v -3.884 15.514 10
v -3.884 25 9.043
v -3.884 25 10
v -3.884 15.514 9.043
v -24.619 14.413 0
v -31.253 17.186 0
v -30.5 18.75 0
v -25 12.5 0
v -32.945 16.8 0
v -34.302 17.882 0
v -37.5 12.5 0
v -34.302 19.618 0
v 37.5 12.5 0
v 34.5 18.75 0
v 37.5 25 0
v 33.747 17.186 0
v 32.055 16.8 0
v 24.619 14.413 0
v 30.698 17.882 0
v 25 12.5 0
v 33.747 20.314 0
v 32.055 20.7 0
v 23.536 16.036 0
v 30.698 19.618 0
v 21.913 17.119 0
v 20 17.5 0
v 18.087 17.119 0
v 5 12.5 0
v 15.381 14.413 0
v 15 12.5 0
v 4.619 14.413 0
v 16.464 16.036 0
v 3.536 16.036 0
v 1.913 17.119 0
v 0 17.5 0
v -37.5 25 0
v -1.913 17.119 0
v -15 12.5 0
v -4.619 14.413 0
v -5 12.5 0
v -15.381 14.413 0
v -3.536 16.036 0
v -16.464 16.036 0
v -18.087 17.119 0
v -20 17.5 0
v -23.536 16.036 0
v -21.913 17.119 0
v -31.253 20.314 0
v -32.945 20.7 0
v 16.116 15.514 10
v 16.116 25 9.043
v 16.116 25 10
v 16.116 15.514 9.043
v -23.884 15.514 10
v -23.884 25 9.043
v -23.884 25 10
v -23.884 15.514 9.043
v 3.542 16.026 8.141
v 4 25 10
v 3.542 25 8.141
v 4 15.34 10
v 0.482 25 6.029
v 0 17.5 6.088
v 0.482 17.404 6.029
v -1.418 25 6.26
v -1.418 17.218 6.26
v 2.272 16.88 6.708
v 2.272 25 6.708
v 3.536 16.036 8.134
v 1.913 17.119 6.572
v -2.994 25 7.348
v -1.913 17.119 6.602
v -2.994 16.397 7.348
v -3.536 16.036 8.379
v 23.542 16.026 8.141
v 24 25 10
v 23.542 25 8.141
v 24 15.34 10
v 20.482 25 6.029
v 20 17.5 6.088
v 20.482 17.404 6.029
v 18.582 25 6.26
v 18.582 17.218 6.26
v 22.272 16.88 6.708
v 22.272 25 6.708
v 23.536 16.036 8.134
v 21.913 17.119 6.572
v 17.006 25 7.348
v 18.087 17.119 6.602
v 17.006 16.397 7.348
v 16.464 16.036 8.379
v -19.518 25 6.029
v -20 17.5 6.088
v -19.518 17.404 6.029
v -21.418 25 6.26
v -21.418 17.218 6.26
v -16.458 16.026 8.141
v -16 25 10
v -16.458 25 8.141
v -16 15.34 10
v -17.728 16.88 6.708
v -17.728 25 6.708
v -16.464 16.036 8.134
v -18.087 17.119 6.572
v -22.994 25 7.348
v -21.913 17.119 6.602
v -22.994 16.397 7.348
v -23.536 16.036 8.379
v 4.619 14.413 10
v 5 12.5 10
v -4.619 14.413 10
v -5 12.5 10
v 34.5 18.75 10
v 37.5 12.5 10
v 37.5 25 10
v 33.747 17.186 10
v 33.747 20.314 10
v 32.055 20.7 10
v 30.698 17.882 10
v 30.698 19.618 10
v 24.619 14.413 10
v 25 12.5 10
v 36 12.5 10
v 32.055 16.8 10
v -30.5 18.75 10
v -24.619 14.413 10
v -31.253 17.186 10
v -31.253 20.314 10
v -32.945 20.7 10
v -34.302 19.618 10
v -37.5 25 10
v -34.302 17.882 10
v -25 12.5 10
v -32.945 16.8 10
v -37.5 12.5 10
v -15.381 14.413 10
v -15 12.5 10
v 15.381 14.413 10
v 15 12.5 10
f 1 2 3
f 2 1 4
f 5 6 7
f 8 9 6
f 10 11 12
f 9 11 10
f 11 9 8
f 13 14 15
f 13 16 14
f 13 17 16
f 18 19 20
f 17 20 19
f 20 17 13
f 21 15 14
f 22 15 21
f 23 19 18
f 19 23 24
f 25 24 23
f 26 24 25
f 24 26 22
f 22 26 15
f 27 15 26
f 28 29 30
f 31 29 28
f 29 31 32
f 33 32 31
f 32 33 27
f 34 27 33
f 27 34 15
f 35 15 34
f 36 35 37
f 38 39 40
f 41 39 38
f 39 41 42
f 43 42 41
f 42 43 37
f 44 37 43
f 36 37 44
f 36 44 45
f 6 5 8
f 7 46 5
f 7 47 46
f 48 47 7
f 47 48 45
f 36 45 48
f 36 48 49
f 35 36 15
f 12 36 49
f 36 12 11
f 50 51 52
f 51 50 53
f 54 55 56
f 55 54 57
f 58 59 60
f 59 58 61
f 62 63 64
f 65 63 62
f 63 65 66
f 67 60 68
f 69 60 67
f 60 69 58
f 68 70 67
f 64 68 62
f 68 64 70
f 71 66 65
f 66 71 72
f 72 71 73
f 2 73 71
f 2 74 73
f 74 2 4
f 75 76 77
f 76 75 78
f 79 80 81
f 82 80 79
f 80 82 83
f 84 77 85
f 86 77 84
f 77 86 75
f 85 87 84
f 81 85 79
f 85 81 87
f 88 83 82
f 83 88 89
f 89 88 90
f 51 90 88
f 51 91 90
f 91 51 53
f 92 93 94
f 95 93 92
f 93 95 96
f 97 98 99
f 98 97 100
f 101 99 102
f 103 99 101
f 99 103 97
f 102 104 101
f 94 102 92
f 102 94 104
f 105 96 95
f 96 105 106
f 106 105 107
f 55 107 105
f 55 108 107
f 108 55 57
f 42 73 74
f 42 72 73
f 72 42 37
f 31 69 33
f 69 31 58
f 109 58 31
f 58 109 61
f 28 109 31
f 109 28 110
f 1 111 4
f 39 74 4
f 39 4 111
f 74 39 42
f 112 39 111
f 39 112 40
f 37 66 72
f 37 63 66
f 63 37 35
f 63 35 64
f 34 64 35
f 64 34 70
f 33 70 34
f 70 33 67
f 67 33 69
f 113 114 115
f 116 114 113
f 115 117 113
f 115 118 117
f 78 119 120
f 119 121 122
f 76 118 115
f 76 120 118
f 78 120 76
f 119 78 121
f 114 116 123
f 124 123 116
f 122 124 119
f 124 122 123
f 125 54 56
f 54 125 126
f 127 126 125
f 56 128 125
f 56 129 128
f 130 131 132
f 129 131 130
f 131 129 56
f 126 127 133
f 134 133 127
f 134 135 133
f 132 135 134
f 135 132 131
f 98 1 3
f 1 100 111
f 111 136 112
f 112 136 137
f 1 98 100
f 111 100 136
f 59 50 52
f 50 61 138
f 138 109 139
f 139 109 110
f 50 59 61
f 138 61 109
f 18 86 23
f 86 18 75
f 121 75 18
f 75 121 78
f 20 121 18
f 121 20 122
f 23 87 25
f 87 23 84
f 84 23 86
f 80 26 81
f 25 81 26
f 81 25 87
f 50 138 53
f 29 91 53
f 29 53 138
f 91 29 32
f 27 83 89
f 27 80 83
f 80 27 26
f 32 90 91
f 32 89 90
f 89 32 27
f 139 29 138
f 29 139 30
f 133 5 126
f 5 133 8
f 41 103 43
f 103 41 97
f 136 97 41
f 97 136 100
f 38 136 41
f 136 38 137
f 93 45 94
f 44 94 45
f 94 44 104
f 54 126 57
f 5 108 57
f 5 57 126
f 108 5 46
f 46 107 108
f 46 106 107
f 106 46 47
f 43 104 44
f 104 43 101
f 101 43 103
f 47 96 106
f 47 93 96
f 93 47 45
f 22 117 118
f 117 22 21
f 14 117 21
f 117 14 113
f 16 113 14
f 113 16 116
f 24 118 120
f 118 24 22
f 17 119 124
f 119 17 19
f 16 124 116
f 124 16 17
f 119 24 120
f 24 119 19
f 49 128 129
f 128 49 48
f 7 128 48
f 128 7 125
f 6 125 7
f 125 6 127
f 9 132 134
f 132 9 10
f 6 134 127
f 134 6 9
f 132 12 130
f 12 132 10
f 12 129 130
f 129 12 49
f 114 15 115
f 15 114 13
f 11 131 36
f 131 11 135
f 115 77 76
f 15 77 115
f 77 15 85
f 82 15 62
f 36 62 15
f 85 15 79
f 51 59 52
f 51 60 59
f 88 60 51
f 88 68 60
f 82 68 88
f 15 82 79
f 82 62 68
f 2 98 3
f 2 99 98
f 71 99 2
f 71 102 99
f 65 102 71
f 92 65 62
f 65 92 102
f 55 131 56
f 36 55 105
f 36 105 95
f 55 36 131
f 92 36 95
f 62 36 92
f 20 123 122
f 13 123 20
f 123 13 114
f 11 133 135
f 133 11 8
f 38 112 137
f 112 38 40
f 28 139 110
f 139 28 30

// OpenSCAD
intersection() {
	union() {
		translate(v = [0, 12.5000000000, 0]) {
			difference() {
				translate(v = [0, 0, 10.0000000000]) {
					cube(center = true, size = [75, 25, 20]);
				}
				translate(v = [0, 12.5000000000, 0]) {
					translate(v = [0, 0, 10.0000000000]) {
						translate(v = [0, 0, 10.0000000000]) {
							cube(center = true, size = [75, 25, 20]);
						}
					}
				}
				union() {
					cylinder(d = 8, h = 30);
					translate(v = [20, 0, 0]) {
						cylinder(d = 8, h = 30);
					}
					translate(v = [-20, 0, 0]) {
						cylinder(d = 8, h = 30);
					}
				}
				translate(v = [0, 15.0000000000, 0]) {
					translate(v = [0, 0, 10.0000000000]) {
						rotate(a = [90, 0, 0]) {
							union() {
								cylinder(d = 8, h = 30);
								translate(v = [20, 0, 0]) {
									cylinder(d = 8, h = 30);
								}
								translate(v = [-20, 0, 0]) {
									cylinder(d = 8, h = 30);
								}
							}
						}
					}
				}
				union() {
					cylinder(d = 10, h = 10.0000000000);
					translate(v = [20, 0, 0]) {
						cylinder(d = 10, h = 10.0000000000);
					}
					translate(v = [-20, 0, 0]) {
						cylinder(d = 10, h = 10.0000000000);
					}
				}
				union() {
					translate(v = [32.5000000000, 0, 0]) {
						translate(v = [0, 6.2500000000, 0]) {
							cylinder(d = 4, h = 30);
						}
					}
					translate(v = [-32.5000000000, 0, 0]) {
						translate(v = [0, 6.2500000000, 0]) {
							cylinder(d = 4, h = 30);
						}
					}
				}
			}
		}
		rotate(a = [0, 0, 180]) {
			translate(v = [0, 12.5000000000, 0]) {
				difference() {
					translate(v = [0, 0, 10.0000000000]) {
						cube(center = true, size = [75, 25, 20]);
					}
					translate(v = [0, 12.5000000000, 0]) {
						translate(v = [0, 0, 10.0000000000]) {
							translate(v = [0, 0, 10.0000000000]) {
								cube(center = true, size = [75, 25, 20]);
							}
						}
					}
					union() {
						cylinder(d = 8, h = 30);
						translate(v = [20, 0, 0]) {
							cylinder(d = 8, h = 30);
						}
						translate(v = [-20, 0, 0]) {
							cylinder(d = 8, h = 30);
						}
					}
					translate(v = [0, 15.0000000000, 0]) {
						translate(v = [0, 0, 10.0000000000]) {
							rotate(a = [90, 0, 0]) {
								union() {
									cylinder(d = 8, h = 30);
									translate(v = [20, 0, 0]) {
										cylinder(d = 8, h = 30);
									}
									translate(v = [-20, 0, 0]) {
										cylinder(d = 8, h = 30);
									}
								}
							}
						}
					}
					union() {
						cylinder(d = 10, h = 10.0000000000);
						translate(v = [20, 0, 0]) {
							cylinder(d = 10, h = 10.0000000000);
						}
						translate(v = [-20, 0, 0]) {
							cylinder(d = 10, h = 10.0000000000);
						}
					}
					union() {
						translate(v = [32.5000000000, 0, 0]) {
							translate(v = [0, 6.2500000000, 0]) {
								cylinder(d = 4, h = 30);
							}
						}
						translate(v = [-32.5000000000, 0, 0]) {
							translate(v = [0, 6.2500000000, 0]) {
								cylinder(d = 4, h = 30);
							}
						}
					}
				}
			}
		}
		difference() {
			translate(v = [37.5000000000, 0, 0]) {
				translate(v = [0, 0, 30.0000000000]) {
					cube(center = true, size = [3, 25, 60]);
				}
			}
			union() {
				translate(v = [0, 0, 34.2857142857]) {
					translate(v = [25.0000000000, 0, 0]) {
						rotate(a = [0, 90, 0]) {
							cylinder(d = 6, h = 30);
						}
					}
				}
				translate(v = [0, 0, 15]) {
					translate(v = [0, 0, 34.2857142857]) {
						translate(v = [25.0000000000, 0, 0]) {
							rotate(a = [0, 90, 0]) {
								cylinder(d = 6, h = 30);
							}
						}
					}
				}
			}
		}
	}
	translate(v = [0, 25, 0]) {
		cube(center = true, size = [75, 25, 20]);
	}
}
